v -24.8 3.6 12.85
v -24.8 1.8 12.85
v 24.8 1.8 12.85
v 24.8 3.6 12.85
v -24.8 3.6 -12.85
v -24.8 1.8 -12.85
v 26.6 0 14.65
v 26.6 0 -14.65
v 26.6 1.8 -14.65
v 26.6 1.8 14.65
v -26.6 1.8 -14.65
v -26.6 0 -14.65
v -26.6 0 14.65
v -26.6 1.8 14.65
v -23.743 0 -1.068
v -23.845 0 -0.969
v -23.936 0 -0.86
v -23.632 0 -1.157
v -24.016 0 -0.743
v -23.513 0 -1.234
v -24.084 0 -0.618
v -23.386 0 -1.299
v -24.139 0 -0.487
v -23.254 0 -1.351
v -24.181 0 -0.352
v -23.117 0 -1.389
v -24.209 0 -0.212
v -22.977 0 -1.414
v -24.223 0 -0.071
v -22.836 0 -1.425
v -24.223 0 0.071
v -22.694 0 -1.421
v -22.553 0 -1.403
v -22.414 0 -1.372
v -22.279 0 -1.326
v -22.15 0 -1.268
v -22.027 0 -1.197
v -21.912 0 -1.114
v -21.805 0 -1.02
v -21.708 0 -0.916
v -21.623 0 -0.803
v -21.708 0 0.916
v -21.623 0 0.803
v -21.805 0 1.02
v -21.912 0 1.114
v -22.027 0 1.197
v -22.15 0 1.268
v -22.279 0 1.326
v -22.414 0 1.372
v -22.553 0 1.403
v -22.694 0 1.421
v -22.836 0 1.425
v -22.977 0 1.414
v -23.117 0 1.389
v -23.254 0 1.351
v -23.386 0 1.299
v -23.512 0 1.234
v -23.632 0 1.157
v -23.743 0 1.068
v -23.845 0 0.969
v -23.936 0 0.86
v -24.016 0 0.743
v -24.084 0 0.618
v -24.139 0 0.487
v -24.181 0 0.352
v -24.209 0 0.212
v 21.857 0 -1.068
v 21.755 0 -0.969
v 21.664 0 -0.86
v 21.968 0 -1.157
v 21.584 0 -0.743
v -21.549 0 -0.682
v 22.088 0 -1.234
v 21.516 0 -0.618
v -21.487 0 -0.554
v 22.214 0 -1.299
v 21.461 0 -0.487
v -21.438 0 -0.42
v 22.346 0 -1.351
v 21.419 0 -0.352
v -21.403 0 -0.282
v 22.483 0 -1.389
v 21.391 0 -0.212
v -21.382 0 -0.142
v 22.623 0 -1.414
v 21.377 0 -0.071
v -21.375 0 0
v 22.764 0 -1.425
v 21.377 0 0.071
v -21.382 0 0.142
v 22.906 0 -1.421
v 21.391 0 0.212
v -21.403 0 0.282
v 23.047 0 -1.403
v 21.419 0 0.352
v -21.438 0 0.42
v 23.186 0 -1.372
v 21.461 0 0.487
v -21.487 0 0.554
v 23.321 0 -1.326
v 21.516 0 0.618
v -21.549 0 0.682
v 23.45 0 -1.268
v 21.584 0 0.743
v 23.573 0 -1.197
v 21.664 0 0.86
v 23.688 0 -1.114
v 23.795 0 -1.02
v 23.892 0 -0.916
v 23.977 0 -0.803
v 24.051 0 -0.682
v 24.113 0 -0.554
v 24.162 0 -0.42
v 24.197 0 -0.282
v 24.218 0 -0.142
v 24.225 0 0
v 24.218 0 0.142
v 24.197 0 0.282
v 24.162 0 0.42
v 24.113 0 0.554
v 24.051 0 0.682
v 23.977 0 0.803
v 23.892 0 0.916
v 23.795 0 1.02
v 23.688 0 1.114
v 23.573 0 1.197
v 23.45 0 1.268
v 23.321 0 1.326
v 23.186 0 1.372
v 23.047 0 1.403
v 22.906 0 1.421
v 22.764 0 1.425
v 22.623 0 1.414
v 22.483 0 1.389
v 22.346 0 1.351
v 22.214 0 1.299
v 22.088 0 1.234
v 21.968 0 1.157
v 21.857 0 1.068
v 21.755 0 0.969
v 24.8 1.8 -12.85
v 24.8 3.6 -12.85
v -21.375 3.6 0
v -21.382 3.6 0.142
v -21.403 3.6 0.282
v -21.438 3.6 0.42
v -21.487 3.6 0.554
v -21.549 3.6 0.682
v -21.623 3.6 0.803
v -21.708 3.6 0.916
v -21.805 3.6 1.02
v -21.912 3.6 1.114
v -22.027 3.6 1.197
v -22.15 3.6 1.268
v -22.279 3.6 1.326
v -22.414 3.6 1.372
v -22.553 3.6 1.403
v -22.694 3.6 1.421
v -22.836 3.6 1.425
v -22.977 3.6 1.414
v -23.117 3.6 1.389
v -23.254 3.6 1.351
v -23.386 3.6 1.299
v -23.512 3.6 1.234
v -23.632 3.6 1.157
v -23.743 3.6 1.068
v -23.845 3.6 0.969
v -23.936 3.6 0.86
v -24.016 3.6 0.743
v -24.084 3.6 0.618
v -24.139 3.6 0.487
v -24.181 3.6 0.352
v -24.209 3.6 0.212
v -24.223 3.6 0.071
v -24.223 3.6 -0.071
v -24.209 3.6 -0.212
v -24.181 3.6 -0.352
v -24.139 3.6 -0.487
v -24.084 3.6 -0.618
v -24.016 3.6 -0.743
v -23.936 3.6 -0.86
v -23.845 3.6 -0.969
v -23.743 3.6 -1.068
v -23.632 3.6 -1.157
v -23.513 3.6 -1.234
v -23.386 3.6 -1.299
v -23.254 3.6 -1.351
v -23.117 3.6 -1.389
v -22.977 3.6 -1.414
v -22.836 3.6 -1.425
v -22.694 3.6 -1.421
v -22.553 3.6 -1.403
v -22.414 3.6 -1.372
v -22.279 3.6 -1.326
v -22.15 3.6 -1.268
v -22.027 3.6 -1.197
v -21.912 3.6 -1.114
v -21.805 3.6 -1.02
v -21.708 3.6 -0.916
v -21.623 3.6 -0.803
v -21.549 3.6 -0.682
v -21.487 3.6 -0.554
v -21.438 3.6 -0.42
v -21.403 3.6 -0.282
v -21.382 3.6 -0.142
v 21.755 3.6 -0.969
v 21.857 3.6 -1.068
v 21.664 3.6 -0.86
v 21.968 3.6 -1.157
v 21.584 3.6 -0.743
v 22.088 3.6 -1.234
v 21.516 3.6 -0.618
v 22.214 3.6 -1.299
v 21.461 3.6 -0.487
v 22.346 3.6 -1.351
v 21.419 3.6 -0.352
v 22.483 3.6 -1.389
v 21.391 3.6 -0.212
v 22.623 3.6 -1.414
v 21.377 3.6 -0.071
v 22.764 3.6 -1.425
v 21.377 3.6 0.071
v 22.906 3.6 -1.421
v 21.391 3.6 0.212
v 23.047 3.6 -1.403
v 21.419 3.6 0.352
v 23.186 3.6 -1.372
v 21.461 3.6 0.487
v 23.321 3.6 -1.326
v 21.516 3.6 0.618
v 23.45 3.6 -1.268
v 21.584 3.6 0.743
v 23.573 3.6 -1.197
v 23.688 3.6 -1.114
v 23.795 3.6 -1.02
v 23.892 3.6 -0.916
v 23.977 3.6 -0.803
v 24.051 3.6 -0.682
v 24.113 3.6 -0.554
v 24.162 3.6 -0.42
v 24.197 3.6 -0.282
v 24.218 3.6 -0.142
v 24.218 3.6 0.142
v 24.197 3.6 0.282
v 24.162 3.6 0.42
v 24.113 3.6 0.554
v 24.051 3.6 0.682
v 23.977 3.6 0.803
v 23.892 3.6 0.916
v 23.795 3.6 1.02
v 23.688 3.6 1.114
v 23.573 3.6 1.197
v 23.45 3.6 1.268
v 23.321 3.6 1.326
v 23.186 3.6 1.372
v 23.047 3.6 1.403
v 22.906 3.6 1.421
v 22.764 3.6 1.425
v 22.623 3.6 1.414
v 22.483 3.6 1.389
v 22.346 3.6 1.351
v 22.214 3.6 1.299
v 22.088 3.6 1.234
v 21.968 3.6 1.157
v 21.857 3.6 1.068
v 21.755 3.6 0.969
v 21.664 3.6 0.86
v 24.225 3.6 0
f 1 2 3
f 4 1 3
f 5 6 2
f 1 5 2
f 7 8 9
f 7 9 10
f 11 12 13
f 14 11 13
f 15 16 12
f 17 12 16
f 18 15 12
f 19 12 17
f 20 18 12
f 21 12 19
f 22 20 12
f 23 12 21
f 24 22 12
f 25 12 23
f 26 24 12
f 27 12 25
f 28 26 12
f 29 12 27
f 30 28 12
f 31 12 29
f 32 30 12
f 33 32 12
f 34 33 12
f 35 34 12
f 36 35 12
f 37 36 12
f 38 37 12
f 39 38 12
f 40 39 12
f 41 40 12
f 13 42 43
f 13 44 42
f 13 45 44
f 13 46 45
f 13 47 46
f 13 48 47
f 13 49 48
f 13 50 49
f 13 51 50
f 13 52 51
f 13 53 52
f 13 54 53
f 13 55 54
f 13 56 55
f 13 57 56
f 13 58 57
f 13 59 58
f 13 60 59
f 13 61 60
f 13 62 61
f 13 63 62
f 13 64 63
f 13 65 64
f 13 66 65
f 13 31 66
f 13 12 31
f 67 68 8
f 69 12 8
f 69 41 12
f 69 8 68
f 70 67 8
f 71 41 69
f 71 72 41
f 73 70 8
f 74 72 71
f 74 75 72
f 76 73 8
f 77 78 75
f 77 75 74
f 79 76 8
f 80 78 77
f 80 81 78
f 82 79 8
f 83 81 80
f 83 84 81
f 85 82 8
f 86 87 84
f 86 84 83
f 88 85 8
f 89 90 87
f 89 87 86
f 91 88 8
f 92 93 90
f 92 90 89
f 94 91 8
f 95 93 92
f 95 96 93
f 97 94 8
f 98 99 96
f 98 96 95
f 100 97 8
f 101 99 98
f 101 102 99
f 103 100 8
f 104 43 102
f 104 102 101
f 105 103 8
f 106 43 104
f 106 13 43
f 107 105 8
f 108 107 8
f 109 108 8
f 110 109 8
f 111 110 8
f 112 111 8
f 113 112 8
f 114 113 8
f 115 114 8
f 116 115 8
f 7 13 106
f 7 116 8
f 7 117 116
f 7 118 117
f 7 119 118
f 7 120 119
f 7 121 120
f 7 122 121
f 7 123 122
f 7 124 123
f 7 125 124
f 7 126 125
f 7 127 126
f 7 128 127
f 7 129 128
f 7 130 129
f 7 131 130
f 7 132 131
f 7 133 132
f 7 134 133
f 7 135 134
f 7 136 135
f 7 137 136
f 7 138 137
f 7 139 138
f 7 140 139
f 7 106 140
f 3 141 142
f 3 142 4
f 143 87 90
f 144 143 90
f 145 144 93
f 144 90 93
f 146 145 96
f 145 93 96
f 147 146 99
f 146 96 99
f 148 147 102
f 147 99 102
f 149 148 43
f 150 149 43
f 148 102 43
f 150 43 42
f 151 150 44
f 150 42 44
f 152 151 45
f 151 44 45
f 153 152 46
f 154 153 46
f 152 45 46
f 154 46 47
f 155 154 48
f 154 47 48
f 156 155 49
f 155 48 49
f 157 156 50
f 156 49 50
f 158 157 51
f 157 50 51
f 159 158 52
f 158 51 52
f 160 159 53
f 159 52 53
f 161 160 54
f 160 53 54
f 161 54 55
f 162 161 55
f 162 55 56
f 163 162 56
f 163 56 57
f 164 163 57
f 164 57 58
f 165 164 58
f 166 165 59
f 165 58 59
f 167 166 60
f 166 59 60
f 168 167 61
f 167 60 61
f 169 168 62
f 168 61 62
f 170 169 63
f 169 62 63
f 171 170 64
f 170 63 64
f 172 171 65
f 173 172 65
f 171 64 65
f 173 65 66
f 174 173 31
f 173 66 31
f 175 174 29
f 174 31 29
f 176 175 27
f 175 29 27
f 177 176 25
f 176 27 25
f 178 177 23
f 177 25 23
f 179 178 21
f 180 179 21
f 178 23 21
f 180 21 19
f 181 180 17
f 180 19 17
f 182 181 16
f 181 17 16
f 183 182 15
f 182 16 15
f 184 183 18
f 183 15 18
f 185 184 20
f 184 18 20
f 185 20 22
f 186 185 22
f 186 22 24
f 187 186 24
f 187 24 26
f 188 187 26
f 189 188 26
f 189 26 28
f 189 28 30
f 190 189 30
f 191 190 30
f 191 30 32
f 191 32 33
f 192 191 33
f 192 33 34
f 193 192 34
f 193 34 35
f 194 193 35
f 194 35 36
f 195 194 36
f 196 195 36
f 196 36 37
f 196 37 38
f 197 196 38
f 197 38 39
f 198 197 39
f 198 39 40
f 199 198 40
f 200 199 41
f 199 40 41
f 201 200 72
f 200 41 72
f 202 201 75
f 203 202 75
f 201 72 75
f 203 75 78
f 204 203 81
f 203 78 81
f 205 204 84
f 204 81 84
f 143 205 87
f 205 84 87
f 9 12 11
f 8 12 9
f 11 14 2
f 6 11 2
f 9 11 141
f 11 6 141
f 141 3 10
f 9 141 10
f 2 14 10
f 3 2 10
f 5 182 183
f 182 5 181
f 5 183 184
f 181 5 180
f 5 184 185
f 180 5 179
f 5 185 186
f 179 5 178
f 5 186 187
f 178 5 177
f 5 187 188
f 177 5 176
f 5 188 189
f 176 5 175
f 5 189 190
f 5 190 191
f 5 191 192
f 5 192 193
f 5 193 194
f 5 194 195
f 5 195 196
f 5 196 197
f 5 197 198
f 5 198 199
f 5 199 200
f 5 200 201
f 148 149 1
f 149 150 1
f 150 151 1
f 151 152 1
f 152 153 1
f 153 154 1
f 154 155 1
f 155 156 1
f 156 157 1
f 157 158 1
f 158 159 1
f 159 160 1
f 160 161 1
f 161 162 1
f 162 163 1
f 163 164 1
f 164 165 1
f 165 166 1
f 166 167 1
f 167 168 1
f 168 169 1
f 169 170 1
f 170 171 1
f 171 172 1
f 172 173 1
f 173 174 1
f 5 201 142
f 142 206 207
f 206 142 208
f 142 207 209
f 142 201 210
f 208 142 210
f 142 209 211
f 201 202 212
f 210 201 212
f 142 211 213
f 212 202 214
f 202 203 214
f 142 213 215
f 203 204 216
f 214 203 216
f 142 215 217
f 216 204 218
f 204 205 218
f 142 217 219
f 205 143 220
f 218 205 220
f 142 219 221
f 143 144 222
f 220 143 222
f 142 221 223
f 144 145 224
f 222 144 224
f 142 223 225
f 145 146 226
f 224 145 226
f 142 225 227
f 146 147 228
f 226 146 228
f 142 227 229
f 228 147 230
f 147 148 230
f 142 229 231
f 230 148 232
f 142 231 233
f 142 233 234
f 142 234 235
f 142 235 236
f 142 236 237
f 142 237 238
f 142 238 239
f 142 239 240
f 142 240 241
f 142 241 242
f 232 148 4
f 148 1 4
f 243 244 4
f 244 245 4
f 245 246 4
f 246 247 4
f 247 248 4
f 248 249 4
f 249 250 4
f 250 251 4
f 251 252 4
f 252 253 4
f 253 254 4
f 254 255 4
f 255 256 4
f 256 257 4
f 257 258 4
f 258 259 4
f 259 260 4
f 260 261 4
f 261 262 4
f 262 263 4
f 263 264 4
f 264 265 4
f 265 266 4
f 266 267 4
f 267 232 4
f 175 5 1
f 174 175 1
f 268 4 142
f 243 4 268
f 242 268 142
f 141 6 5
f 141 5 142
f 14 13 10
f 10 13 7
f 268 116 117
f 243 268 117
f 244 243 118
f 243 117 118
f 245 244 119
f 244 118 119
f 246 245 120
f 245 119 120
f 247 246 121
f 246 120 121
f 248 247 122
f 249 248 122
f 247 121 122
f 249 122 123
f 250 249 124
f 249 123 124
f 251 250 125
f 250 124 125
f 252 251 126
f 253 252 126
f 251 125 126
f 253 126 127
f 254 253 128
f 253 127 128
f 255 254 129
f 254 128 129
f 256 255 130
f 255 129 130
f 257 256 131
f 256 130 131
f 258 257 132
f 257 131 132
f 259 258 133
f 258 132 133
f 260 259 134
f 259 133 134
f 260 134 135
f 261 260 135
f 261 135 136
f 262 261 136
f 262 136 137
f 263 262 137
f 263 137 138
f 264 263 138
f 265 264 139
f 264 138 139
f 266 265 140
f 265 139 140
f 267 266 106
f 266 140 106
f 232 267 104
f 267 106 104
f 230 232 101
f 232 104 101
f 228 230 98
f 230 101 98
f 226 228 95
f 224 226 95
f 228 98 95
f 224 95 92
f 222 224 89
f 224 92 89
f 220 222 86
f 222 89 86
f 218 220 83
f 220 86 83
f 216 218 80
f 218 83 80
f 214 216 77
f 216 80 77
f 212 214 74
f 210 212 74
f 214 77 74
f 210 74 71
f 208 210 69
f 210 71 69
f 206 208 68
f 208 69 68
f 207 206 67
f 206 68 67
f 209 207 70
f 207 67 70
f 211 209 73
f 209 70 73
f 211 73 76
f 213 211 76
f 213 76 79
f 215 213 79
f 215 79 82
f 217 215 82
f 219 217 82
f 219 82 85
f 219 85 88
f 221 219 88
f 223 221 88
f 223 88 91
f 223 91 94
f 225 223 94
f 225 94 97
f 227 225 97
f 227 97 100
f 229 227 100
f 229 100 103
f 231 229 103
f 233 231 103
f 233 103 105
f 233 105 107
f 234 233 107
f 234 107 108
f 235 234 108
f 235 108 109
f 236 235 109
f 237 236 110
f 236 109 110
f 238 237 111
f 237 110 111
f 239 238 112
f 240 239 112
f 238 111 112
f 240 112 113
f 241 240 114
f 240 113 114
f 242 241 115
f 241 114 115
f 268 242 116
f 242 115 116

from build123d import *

# Parameters (mm, degrees)
F0_W     = 49.6
F0_H     = 25.7
F0_R     = 1.425
F1_DEPTH = 3.6
F0_W_2   = 53.2
F0_H_2   = 29.3
F2_DEPTH = 1.8


with BuildPart() as f1:
    # F0 (on Front) → F1 (new body)
    with BuildSketch(Plane.XZ):
        Rectangle(F0_W, F0_H)
        with Locations((-22.8, 0)):
            Circle(F0_R, mode=Mode.SUBTRACT)
        with Locations((22.8, 0)):
            Circle(F0_R, mode=Mode.SUBTRACT)
    extrude(amount=-F1_DEPTH)

    # F0 (on Front) → F2 (join)
    with BuildSketch(Plane.XZ):
        Rectangle(F0_W_2, F0_H_2)
        Rectangle(F0_W, F0_H, mode=Mode.SUBTRACT)
    extrude(amount=-F2_DEPTH)


solid = f1.part
